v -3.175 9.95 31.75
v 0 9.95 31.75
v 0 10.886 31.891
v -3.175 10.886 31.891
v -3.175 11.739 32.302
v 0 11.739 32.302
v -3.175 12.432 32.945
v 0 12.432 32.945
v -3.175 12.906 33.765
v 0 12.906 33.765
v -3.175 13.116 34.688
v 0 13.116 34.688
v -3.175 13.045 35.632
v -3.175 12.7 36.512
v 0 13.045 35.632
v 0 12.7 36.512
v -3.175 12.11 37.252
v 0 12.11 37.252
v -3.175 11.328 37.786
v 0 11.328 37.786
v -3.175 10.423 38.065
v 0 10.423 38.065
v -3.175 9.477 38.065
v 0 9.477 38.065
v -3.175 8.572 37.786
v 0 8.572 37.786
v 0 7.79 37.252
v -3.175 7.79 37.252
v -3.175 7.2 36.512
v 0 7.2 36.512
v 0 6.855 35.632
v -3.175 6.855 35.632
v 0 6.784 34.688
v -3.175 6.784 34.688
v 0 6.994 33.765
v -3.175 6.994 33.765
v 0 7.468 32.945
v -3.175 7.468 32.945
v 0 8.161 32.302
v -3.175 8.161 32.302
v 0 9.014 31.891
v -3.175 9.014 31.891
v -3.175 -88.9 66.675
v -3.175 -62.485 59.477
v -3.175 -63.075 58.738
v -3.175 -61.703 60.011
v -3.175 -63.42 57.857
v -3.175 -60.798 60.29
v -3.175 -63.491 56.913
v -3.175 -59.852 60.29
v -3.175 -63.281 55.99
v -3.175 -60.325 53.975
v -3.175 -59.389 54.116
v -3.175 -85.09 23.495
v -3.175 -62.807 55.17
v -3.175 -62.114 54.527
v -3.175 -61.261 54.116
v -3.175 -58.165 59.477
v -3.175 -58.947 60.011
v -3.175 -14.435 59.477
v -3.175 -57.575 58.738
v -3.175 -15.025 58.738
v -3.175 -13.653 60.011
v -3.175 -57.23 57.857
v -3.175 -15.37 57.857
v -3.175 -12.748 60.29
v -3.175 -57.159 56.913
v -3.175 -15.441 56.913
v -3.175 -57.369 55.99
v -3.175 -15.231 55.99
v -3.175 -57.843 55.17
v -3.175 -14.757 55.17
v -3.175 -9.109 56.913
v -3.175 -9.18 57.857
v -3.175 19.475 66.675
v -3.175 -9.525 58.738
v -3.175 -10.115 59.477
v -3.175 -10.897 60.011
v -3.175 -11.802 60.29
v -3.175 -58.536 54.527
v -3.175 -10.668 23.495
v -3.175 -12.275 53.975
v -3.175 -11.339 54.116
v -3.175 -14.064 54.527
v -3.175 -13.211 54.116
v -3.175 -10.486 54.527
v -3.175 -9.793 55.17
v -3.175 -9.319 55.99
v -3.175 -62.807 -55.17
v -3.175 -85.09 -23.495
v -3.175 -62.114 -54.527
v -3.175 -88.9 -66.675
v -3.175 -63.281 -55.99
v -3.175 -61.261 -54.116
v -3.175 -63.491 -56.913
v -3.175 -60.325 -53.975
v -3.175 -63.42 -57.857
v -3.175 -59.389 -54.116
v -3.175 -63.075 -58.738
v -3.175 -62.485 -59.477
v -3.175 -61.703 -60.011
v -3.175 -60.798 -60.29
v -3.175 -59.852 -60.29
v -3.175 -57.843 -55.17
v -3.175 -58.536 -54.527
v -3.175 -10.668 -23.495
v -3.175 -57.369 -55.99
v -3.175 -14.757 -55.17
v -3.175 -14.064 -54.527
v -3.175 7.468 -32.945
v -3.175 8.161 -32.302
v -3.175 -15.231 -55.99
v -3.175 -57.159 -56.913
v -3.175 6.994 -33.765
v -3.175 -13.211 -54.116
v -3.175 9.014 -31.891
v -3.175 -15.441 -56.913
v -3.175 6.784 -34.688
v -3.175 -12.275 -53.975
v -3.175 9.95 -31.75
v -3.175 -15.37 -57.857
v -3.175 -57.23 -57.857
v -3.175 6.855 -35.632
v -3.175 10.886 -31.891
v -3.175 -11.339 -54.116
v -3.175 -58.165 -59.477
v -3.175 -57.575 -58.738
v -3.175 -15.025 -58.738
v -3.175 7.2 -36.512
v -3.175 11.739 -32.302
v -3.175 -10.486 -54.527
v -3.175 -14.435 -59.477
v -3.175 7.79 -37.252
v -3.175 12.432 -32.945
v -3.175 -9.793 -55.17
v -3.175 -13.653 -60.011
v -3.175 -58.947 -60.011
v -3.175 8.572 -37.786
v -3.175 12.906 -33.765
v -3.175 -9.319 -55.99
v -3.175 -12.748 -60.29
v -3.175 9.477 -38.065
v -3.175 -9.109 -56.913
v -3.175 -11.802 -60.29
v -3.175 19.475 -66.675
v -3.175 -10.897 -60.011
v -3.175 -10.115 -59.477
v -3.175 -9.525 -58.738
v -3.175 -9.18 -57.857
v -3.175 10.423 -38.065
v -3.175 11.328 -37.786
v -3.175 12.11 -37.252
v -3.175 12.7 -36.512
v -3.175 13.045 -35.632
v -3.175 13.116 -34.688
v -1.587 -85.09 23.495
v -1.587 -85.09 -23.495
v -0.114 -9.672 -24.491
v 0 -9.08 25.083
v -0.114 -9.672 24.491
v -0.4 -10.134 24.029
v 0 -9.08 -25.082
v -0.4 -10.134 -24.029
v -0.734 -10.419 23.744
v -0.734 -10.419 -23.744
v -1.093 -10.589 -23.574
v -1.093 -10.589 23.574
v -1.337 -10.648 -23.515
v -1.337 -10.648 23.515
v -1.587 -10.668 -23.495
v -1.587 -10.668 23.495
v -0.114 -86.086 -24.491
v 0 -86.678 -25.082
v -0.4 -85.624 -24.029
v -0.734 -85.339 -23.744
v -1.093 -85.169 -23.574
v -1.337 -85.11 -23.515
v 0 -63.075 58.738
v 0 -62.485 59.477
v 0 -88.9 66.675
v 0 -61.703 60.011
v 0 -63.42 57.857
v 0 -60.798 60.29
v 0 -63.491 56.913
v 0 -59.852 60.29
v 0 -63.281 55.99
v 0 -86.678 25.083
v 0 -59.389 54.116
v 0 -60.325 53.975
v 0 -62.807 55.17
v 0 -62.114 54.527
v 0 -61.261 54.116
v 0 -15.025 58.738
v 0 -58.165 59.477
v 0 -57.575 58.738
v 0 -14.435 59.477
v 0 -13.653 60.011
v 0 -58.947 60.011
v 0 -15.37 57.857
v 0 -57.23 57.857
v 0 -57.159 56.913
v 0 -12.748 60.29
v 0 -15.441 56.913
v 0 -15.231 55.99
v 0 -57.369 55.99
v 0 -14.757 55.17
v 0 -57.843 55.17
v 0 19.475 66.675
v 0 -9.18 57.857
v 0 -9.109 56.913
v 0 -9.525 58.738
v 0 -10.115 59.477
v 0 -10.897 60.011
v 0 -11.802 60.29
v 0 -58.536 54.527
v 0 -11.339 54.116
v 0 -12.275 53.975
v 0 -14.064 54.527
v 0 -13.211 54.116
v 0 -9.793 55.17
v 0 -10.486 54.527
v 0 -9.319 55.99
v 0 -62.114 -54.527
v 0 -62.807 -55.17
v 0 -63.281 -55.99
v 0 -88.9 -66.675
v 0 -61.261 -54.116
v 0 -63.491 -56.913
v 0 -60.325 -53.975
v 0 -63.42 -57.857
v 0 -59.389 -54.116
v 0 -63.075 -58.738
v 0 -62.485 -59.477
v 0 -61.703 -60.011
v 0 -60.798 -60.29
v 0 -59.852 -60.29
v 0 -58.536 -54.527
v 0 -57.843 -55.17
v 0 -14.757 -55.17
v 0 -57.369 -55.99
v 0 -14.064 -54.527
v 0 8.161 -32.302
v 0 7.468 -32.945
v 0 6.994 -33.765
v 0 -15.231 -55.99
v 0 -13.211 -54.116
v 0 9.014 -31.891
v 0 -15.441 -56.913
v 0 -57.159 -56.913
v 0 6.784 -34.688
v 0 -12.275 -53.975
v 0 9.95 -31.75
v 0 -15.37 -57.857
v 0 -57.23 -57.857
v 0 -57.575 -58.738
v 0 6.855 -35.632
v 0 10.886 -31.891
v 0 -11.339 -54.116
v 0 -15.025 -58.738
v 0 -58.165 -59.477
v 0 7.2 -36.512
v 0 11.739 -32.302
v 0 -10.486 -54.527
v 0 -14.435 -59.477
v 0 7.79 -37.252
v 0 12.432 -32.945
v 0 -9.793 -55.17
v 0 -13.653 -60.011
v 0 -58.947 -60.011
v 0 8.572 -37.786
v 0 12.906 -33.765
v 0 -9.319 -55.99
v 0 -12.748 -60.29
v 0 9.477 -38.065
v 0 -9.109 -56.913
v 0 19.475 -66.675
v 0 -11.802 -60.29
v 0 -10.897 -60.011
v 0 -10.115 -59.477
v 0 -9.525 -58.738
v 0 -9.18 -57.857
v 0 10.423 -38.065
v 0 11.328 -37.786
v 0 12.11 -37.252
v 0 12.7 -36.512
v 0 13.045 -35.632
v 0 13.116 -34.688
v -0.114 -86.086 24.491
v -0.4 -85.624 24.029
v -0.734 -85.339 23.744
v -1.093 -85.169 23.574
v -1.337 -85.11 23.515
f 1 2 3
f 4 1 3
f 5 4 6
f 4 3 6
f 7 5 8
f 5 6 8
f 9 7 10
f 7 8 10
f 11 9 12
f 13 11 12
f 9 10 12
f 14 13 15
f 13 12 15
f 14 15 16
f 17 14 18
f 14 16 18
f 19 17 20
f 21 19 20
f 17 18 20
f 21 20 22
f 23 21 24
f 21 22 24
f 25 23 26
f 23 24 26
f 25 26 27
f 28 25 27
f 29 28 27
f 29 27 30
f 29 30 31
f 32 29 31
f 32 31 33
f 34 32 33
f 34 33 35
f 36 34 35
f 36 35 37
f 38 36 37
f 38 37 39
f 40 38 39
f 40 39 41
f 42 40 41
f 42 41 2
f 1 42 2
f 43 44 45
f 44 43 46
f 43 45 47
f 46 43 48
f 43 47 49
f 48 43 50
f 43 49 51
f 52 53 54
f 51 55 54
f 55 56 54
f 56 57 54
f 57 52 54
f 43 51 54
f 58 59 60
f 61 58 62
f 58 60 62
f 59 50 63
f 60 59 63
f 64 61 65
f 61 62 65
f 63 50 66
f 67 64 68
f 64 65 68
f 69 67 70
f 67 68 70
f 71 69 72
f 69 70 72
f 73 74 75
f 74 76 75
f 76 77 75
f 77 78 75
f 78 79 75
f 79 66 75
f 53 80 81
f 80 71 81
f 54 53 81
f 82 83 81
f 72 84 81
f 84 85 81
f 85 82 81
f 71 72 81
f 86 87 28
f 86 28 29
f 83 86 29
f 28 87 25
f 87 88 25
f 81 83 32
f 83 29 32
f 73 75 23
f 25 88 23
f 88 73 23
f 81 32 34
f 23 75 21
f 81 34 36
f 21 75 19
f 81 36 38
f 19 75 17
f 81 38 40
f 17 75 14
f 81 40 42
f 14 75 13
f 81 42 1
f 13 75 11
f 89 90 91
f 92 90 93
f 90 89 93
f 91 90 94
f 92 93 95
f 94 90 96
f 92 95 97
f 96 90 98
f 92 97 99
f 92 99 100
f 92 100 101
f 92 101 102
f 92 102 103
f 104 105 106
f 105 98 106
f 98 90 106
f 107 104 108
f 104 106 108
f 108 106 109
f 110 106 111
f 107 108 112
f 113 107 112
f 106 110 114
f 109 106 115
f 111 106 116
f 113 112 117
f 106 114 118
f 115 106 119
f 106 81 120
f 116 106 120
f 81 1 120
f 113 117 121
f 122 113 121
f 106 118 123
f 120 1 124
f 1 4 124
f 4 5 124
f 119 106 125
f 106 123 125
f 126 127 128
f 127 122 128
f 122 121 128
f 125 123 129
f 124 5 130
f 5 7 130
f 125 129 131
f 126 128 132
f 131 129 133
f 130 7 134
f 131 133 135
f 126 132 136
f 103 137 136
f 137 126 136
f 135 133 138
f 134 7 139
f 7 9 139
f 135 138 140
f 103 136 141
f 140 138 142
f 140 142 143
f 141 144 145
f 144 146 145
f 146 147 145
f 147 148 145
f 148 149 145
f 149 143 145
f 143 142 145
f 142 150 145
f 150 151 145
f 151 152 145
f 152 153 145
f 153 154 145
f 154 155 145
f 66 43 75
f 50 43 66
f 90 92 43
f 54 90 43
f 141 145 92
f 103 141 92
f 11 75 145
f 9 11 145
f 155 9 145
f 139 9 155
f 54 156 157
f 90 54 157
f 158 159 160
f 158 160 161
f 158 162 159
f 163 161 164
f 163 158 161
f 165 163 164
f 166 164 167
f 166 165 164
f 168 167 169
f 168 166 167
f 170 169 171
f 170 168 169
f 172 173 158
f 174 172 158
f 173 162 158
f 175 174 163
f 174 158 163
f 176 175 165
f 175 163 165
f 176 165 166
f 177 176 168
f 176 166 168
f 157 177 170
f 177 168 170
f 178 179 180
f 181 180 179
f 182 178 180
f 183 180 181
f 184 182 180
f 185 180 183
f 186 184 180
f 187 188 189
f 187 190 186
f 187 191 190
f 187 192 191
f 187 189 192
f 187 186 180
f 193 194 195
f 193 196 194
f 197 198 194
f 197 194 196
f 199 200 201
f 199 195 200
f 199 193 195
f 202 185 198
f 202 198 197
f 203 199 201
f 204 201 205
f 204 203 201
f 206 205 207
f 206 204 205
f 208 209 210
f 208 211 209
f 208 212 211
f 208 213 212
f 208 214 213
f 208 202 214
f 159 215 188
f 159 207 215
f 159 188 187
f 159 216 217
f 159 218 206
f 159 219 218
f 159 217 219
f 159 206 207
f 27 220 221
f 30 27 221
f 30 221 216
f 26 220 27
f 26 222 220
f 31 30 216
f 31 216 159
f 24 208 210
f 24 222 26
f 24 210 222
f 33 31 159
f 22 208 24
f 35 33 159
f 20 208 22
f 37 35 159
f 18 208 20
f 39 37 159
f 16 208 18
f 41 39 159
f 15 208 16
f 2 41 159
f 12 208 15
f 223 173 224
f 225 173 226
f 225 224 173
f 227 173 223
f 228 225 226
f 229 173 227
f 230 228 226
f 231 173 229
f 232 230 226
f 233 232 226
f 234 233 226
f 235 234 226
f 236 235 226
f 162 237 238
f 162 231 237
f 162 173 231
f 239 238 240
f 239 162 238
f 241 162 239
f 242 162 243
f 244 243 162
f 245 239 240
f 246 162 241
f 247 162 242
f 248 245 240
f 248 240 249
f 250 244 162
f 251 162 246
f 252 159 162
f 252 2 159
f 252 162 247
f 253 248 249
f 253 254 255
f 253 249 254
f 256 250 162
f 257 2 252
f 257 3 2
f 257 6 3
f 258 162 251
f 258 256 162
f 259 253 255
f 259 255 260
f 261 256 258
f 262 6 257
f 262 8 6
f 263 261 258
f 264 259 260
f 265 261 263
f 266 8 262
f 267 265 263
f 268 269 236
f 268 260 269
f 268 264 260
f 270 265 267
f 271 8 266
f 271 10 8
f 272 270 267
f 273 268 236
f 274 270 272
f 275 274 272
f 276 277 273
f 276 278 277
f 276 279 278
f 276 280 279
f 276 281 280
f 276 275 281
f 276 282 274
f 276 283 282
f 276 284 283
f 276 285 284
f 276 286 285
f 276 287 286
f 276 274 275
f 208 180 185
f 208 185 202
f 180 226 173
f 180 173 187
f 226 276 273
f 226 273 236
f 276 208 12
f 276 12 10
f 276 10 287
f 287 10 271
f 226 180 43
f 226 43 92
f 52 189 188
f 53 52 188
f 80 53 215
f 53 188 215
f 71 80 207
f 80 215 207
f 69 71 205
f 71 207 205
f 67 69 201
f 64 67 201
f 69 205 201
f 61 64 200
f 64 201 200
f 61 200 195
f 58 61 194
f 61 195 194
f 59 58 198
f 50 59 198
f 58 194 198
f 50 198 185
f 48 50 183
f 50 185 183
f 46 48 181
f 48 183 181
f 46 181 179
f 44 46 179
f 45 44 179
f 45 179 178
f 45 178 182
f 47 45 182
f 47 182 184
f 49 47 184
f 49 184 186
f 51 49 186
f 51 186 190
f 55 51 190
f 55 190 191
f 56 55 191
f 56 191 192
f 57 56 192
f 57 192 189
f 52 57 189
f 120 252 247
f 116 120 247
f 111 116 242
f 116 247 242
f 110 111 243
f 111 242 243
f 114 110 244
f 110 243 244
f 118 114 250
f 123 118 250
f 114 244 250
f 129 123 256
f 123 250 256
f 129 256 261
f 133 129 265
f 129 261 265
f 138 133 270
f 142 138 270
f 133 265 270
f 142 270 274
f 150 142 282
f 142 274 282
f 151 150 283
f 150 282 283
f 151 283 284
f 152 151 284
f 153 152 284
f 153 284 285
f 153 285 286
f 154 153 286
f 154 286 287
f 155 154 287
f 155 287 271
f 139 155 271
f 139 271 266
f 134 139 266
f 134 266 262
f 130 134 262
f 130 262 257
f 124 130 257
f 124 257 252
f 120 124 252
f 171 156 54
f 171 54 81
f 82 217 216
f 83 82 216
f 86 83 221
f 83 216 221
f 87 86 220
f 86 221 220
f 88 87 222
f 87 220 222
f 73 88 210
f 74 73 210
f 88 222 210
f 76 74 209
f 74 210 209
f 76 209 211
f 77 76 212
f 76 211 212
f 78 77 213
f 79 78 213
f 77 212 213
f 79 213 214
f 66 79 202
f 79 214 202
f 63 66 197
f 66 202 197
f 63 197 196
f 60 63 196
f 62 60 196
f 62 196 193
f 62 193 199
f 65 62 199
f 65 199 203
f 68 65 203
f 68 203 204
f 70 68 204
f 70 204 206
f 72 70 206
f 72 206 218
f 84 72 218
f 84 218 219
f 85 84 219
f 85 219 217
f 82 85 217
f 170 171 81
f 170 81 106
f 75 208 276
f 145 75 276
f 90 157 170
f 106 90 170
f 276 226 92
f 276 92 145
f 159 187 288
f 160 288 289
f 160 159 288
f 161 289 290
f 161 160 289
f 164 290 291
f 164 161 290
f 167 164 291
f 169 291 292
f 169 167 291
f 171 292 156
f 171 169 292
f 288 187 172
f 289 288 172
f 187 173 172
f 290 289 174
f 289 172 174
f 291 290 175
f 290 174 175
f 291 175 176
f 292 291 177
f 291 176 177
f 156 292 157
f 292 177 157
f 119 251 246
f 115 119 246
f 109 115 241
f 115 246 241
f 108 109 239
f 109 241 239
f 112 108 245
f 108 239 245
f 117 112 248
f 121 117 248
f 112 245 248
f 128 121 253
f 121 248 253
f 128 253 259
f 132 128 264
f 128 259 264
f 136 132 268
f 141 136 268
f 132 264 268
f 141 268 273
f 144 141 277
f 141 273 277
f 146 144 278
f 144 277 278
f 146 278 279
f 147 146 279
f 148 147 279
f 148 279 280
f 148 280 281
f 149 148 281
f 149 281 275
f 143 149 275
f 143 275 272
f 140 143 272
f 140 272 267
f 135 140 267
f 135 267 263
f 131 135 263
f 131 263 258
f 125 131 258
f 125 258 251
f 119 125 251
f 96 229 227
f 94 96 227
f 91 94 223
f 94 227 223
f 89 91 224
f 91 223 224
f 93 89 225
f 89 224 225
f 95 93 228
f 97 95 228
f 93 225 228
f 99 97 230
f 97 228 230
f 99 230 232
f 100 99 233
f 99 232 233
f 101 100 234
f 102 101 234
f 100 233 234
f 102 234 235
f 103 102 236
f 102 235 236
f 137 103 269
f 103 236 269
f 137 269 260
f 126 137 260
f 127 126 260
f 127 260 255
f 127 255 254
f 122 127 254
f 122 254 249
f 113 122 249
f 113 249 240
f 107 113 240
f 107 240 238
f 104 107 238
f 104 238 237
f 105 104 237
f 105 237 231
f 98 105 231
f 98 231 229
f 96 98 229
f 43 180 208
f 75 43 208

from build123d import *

# Parameters (mm, degrees)
SKETCH1_W           = 127
SKETCH1_H           = 177.8
BOSS_EXTRUDE1_DEPTH = 3.175
SKETCH7_W           = 127
SKETCH7_H           = 69.425000088
CUT_EXTRUDE5_DEPTH  = 110.295656936
SKETCH8_W           = 3.175
SKETCH8_H           = 108.374999912
BOSS_EXTRUDE2_DEPTH = 3.175
SKETCH9_W           = 46.99
SKETCH9_H           = 74.422
CUT_EXTRUDE6_DEPTH  = 112.17034789
FILLET1_R           = 1.5875
SKETCH10_R          = 3.175
CUT_EXTRUDE7_DEPTH  = 112.17034789


with BuildPart() as part:
    # Sketch1 → Boss-Extrude1 (new body)
    with BuildSketch(Plane(origin=(0, 0, 0), x_dir=(0, 0, -1), z_dir=(1, 0, 0))):
        Rectangle(SKETCH1_W, SKETCH1_H)
    extrude(amount=-BOSS_EXTRUDE1_DEPTH)

    # Sketch7 → Cut-Extrude5 (cut, through all)
    with BuildSketch(Plane(origin=(0, 0, 0), x_dir=(0, 0, -1), z_dir=(1, 0, 0))):
        with Locations((0, 54.187499956)):
            Rectangle(SKETCH7_W, SKETCH7_H)
    extrude(amount=-CUT_EXTRUDE5_DEPTH, mode=Mode.SUBTRACT)

    # Sketch8 → Boss-Extrude2 (add)
    with BuildSketch(Plane(origin=(0, 0, 0), x_dir=(0, 0, -1), z_dir=(1, 0, 0))):
        with Locations((-65.0875, -34.712500044)):
            Rectangle(SKETCH8_W, SKETCH8_H)
        with Locations((65.0875, -34.712500044)):
            Rectangle(SKETCH8_W, SKETCH8_H)
    extrude(amount=-BOSS_EXTRUDE2_DEPTH)

    # Sketch9 → Cut-Extrude6 (cut, through all)
    with BuildSketch(Plane(origin=(0, 0, 0), x_dir=(0, 0, -1), z_dir=(1, 0, 0))):
        with Locations((0, -47.879)):
            Rectangle(SKETCH9_W, SKETCH9_H)
    extrude(amount=-CUT_EXTRUDE6_DEPTH, mode=Mode.SUBTRACT)

    # Fillet1
    fillet1_edges = [part.edges().sort_by_distance(p)[0] for p in [
        (0, -10.668, 0),
        (0, -85.09, 0),
        (0, -47.879, 23.495),
        (0, -47.879, -23.495),
    ]]
    fillet(fillet1_edges, radius=FILLET1_R)

    # Sketch10 → Cut-Extrude7 (cut, through all)
    with BuildSketch(Plane(origin=(0, 0, 0), x_dir=(0, 0, -1), z_dir=(1, 0, 0))):
        with Locations((-57.15, -60.325)):
            Circle(SKETCH10_R)
        with Locations((-57.15, -12.275000088)):
            Circle(SKETCH10_R)
        with Locations((-34.925, 9.949999912)):
            Circle(SKETCH10_R)
        with Locations(Location((34.925, 9.949999912, 0), (0, 0, 180))):
            Circle(SKETCH10_R)
        with Locations(Location((57.15, -12.275000088, 0), (0, 0, 180))):
            Circle(SKETCH10_R)
        with Locations(Location((57.15, -60.325, 0), (0, 0, 180))):
            Circle(SKETCH10_R)
    extrude(amount=-CUT_EXTRUDE7_DEPTH, mode=Mode.SUBTRACT)


solid = part.part
